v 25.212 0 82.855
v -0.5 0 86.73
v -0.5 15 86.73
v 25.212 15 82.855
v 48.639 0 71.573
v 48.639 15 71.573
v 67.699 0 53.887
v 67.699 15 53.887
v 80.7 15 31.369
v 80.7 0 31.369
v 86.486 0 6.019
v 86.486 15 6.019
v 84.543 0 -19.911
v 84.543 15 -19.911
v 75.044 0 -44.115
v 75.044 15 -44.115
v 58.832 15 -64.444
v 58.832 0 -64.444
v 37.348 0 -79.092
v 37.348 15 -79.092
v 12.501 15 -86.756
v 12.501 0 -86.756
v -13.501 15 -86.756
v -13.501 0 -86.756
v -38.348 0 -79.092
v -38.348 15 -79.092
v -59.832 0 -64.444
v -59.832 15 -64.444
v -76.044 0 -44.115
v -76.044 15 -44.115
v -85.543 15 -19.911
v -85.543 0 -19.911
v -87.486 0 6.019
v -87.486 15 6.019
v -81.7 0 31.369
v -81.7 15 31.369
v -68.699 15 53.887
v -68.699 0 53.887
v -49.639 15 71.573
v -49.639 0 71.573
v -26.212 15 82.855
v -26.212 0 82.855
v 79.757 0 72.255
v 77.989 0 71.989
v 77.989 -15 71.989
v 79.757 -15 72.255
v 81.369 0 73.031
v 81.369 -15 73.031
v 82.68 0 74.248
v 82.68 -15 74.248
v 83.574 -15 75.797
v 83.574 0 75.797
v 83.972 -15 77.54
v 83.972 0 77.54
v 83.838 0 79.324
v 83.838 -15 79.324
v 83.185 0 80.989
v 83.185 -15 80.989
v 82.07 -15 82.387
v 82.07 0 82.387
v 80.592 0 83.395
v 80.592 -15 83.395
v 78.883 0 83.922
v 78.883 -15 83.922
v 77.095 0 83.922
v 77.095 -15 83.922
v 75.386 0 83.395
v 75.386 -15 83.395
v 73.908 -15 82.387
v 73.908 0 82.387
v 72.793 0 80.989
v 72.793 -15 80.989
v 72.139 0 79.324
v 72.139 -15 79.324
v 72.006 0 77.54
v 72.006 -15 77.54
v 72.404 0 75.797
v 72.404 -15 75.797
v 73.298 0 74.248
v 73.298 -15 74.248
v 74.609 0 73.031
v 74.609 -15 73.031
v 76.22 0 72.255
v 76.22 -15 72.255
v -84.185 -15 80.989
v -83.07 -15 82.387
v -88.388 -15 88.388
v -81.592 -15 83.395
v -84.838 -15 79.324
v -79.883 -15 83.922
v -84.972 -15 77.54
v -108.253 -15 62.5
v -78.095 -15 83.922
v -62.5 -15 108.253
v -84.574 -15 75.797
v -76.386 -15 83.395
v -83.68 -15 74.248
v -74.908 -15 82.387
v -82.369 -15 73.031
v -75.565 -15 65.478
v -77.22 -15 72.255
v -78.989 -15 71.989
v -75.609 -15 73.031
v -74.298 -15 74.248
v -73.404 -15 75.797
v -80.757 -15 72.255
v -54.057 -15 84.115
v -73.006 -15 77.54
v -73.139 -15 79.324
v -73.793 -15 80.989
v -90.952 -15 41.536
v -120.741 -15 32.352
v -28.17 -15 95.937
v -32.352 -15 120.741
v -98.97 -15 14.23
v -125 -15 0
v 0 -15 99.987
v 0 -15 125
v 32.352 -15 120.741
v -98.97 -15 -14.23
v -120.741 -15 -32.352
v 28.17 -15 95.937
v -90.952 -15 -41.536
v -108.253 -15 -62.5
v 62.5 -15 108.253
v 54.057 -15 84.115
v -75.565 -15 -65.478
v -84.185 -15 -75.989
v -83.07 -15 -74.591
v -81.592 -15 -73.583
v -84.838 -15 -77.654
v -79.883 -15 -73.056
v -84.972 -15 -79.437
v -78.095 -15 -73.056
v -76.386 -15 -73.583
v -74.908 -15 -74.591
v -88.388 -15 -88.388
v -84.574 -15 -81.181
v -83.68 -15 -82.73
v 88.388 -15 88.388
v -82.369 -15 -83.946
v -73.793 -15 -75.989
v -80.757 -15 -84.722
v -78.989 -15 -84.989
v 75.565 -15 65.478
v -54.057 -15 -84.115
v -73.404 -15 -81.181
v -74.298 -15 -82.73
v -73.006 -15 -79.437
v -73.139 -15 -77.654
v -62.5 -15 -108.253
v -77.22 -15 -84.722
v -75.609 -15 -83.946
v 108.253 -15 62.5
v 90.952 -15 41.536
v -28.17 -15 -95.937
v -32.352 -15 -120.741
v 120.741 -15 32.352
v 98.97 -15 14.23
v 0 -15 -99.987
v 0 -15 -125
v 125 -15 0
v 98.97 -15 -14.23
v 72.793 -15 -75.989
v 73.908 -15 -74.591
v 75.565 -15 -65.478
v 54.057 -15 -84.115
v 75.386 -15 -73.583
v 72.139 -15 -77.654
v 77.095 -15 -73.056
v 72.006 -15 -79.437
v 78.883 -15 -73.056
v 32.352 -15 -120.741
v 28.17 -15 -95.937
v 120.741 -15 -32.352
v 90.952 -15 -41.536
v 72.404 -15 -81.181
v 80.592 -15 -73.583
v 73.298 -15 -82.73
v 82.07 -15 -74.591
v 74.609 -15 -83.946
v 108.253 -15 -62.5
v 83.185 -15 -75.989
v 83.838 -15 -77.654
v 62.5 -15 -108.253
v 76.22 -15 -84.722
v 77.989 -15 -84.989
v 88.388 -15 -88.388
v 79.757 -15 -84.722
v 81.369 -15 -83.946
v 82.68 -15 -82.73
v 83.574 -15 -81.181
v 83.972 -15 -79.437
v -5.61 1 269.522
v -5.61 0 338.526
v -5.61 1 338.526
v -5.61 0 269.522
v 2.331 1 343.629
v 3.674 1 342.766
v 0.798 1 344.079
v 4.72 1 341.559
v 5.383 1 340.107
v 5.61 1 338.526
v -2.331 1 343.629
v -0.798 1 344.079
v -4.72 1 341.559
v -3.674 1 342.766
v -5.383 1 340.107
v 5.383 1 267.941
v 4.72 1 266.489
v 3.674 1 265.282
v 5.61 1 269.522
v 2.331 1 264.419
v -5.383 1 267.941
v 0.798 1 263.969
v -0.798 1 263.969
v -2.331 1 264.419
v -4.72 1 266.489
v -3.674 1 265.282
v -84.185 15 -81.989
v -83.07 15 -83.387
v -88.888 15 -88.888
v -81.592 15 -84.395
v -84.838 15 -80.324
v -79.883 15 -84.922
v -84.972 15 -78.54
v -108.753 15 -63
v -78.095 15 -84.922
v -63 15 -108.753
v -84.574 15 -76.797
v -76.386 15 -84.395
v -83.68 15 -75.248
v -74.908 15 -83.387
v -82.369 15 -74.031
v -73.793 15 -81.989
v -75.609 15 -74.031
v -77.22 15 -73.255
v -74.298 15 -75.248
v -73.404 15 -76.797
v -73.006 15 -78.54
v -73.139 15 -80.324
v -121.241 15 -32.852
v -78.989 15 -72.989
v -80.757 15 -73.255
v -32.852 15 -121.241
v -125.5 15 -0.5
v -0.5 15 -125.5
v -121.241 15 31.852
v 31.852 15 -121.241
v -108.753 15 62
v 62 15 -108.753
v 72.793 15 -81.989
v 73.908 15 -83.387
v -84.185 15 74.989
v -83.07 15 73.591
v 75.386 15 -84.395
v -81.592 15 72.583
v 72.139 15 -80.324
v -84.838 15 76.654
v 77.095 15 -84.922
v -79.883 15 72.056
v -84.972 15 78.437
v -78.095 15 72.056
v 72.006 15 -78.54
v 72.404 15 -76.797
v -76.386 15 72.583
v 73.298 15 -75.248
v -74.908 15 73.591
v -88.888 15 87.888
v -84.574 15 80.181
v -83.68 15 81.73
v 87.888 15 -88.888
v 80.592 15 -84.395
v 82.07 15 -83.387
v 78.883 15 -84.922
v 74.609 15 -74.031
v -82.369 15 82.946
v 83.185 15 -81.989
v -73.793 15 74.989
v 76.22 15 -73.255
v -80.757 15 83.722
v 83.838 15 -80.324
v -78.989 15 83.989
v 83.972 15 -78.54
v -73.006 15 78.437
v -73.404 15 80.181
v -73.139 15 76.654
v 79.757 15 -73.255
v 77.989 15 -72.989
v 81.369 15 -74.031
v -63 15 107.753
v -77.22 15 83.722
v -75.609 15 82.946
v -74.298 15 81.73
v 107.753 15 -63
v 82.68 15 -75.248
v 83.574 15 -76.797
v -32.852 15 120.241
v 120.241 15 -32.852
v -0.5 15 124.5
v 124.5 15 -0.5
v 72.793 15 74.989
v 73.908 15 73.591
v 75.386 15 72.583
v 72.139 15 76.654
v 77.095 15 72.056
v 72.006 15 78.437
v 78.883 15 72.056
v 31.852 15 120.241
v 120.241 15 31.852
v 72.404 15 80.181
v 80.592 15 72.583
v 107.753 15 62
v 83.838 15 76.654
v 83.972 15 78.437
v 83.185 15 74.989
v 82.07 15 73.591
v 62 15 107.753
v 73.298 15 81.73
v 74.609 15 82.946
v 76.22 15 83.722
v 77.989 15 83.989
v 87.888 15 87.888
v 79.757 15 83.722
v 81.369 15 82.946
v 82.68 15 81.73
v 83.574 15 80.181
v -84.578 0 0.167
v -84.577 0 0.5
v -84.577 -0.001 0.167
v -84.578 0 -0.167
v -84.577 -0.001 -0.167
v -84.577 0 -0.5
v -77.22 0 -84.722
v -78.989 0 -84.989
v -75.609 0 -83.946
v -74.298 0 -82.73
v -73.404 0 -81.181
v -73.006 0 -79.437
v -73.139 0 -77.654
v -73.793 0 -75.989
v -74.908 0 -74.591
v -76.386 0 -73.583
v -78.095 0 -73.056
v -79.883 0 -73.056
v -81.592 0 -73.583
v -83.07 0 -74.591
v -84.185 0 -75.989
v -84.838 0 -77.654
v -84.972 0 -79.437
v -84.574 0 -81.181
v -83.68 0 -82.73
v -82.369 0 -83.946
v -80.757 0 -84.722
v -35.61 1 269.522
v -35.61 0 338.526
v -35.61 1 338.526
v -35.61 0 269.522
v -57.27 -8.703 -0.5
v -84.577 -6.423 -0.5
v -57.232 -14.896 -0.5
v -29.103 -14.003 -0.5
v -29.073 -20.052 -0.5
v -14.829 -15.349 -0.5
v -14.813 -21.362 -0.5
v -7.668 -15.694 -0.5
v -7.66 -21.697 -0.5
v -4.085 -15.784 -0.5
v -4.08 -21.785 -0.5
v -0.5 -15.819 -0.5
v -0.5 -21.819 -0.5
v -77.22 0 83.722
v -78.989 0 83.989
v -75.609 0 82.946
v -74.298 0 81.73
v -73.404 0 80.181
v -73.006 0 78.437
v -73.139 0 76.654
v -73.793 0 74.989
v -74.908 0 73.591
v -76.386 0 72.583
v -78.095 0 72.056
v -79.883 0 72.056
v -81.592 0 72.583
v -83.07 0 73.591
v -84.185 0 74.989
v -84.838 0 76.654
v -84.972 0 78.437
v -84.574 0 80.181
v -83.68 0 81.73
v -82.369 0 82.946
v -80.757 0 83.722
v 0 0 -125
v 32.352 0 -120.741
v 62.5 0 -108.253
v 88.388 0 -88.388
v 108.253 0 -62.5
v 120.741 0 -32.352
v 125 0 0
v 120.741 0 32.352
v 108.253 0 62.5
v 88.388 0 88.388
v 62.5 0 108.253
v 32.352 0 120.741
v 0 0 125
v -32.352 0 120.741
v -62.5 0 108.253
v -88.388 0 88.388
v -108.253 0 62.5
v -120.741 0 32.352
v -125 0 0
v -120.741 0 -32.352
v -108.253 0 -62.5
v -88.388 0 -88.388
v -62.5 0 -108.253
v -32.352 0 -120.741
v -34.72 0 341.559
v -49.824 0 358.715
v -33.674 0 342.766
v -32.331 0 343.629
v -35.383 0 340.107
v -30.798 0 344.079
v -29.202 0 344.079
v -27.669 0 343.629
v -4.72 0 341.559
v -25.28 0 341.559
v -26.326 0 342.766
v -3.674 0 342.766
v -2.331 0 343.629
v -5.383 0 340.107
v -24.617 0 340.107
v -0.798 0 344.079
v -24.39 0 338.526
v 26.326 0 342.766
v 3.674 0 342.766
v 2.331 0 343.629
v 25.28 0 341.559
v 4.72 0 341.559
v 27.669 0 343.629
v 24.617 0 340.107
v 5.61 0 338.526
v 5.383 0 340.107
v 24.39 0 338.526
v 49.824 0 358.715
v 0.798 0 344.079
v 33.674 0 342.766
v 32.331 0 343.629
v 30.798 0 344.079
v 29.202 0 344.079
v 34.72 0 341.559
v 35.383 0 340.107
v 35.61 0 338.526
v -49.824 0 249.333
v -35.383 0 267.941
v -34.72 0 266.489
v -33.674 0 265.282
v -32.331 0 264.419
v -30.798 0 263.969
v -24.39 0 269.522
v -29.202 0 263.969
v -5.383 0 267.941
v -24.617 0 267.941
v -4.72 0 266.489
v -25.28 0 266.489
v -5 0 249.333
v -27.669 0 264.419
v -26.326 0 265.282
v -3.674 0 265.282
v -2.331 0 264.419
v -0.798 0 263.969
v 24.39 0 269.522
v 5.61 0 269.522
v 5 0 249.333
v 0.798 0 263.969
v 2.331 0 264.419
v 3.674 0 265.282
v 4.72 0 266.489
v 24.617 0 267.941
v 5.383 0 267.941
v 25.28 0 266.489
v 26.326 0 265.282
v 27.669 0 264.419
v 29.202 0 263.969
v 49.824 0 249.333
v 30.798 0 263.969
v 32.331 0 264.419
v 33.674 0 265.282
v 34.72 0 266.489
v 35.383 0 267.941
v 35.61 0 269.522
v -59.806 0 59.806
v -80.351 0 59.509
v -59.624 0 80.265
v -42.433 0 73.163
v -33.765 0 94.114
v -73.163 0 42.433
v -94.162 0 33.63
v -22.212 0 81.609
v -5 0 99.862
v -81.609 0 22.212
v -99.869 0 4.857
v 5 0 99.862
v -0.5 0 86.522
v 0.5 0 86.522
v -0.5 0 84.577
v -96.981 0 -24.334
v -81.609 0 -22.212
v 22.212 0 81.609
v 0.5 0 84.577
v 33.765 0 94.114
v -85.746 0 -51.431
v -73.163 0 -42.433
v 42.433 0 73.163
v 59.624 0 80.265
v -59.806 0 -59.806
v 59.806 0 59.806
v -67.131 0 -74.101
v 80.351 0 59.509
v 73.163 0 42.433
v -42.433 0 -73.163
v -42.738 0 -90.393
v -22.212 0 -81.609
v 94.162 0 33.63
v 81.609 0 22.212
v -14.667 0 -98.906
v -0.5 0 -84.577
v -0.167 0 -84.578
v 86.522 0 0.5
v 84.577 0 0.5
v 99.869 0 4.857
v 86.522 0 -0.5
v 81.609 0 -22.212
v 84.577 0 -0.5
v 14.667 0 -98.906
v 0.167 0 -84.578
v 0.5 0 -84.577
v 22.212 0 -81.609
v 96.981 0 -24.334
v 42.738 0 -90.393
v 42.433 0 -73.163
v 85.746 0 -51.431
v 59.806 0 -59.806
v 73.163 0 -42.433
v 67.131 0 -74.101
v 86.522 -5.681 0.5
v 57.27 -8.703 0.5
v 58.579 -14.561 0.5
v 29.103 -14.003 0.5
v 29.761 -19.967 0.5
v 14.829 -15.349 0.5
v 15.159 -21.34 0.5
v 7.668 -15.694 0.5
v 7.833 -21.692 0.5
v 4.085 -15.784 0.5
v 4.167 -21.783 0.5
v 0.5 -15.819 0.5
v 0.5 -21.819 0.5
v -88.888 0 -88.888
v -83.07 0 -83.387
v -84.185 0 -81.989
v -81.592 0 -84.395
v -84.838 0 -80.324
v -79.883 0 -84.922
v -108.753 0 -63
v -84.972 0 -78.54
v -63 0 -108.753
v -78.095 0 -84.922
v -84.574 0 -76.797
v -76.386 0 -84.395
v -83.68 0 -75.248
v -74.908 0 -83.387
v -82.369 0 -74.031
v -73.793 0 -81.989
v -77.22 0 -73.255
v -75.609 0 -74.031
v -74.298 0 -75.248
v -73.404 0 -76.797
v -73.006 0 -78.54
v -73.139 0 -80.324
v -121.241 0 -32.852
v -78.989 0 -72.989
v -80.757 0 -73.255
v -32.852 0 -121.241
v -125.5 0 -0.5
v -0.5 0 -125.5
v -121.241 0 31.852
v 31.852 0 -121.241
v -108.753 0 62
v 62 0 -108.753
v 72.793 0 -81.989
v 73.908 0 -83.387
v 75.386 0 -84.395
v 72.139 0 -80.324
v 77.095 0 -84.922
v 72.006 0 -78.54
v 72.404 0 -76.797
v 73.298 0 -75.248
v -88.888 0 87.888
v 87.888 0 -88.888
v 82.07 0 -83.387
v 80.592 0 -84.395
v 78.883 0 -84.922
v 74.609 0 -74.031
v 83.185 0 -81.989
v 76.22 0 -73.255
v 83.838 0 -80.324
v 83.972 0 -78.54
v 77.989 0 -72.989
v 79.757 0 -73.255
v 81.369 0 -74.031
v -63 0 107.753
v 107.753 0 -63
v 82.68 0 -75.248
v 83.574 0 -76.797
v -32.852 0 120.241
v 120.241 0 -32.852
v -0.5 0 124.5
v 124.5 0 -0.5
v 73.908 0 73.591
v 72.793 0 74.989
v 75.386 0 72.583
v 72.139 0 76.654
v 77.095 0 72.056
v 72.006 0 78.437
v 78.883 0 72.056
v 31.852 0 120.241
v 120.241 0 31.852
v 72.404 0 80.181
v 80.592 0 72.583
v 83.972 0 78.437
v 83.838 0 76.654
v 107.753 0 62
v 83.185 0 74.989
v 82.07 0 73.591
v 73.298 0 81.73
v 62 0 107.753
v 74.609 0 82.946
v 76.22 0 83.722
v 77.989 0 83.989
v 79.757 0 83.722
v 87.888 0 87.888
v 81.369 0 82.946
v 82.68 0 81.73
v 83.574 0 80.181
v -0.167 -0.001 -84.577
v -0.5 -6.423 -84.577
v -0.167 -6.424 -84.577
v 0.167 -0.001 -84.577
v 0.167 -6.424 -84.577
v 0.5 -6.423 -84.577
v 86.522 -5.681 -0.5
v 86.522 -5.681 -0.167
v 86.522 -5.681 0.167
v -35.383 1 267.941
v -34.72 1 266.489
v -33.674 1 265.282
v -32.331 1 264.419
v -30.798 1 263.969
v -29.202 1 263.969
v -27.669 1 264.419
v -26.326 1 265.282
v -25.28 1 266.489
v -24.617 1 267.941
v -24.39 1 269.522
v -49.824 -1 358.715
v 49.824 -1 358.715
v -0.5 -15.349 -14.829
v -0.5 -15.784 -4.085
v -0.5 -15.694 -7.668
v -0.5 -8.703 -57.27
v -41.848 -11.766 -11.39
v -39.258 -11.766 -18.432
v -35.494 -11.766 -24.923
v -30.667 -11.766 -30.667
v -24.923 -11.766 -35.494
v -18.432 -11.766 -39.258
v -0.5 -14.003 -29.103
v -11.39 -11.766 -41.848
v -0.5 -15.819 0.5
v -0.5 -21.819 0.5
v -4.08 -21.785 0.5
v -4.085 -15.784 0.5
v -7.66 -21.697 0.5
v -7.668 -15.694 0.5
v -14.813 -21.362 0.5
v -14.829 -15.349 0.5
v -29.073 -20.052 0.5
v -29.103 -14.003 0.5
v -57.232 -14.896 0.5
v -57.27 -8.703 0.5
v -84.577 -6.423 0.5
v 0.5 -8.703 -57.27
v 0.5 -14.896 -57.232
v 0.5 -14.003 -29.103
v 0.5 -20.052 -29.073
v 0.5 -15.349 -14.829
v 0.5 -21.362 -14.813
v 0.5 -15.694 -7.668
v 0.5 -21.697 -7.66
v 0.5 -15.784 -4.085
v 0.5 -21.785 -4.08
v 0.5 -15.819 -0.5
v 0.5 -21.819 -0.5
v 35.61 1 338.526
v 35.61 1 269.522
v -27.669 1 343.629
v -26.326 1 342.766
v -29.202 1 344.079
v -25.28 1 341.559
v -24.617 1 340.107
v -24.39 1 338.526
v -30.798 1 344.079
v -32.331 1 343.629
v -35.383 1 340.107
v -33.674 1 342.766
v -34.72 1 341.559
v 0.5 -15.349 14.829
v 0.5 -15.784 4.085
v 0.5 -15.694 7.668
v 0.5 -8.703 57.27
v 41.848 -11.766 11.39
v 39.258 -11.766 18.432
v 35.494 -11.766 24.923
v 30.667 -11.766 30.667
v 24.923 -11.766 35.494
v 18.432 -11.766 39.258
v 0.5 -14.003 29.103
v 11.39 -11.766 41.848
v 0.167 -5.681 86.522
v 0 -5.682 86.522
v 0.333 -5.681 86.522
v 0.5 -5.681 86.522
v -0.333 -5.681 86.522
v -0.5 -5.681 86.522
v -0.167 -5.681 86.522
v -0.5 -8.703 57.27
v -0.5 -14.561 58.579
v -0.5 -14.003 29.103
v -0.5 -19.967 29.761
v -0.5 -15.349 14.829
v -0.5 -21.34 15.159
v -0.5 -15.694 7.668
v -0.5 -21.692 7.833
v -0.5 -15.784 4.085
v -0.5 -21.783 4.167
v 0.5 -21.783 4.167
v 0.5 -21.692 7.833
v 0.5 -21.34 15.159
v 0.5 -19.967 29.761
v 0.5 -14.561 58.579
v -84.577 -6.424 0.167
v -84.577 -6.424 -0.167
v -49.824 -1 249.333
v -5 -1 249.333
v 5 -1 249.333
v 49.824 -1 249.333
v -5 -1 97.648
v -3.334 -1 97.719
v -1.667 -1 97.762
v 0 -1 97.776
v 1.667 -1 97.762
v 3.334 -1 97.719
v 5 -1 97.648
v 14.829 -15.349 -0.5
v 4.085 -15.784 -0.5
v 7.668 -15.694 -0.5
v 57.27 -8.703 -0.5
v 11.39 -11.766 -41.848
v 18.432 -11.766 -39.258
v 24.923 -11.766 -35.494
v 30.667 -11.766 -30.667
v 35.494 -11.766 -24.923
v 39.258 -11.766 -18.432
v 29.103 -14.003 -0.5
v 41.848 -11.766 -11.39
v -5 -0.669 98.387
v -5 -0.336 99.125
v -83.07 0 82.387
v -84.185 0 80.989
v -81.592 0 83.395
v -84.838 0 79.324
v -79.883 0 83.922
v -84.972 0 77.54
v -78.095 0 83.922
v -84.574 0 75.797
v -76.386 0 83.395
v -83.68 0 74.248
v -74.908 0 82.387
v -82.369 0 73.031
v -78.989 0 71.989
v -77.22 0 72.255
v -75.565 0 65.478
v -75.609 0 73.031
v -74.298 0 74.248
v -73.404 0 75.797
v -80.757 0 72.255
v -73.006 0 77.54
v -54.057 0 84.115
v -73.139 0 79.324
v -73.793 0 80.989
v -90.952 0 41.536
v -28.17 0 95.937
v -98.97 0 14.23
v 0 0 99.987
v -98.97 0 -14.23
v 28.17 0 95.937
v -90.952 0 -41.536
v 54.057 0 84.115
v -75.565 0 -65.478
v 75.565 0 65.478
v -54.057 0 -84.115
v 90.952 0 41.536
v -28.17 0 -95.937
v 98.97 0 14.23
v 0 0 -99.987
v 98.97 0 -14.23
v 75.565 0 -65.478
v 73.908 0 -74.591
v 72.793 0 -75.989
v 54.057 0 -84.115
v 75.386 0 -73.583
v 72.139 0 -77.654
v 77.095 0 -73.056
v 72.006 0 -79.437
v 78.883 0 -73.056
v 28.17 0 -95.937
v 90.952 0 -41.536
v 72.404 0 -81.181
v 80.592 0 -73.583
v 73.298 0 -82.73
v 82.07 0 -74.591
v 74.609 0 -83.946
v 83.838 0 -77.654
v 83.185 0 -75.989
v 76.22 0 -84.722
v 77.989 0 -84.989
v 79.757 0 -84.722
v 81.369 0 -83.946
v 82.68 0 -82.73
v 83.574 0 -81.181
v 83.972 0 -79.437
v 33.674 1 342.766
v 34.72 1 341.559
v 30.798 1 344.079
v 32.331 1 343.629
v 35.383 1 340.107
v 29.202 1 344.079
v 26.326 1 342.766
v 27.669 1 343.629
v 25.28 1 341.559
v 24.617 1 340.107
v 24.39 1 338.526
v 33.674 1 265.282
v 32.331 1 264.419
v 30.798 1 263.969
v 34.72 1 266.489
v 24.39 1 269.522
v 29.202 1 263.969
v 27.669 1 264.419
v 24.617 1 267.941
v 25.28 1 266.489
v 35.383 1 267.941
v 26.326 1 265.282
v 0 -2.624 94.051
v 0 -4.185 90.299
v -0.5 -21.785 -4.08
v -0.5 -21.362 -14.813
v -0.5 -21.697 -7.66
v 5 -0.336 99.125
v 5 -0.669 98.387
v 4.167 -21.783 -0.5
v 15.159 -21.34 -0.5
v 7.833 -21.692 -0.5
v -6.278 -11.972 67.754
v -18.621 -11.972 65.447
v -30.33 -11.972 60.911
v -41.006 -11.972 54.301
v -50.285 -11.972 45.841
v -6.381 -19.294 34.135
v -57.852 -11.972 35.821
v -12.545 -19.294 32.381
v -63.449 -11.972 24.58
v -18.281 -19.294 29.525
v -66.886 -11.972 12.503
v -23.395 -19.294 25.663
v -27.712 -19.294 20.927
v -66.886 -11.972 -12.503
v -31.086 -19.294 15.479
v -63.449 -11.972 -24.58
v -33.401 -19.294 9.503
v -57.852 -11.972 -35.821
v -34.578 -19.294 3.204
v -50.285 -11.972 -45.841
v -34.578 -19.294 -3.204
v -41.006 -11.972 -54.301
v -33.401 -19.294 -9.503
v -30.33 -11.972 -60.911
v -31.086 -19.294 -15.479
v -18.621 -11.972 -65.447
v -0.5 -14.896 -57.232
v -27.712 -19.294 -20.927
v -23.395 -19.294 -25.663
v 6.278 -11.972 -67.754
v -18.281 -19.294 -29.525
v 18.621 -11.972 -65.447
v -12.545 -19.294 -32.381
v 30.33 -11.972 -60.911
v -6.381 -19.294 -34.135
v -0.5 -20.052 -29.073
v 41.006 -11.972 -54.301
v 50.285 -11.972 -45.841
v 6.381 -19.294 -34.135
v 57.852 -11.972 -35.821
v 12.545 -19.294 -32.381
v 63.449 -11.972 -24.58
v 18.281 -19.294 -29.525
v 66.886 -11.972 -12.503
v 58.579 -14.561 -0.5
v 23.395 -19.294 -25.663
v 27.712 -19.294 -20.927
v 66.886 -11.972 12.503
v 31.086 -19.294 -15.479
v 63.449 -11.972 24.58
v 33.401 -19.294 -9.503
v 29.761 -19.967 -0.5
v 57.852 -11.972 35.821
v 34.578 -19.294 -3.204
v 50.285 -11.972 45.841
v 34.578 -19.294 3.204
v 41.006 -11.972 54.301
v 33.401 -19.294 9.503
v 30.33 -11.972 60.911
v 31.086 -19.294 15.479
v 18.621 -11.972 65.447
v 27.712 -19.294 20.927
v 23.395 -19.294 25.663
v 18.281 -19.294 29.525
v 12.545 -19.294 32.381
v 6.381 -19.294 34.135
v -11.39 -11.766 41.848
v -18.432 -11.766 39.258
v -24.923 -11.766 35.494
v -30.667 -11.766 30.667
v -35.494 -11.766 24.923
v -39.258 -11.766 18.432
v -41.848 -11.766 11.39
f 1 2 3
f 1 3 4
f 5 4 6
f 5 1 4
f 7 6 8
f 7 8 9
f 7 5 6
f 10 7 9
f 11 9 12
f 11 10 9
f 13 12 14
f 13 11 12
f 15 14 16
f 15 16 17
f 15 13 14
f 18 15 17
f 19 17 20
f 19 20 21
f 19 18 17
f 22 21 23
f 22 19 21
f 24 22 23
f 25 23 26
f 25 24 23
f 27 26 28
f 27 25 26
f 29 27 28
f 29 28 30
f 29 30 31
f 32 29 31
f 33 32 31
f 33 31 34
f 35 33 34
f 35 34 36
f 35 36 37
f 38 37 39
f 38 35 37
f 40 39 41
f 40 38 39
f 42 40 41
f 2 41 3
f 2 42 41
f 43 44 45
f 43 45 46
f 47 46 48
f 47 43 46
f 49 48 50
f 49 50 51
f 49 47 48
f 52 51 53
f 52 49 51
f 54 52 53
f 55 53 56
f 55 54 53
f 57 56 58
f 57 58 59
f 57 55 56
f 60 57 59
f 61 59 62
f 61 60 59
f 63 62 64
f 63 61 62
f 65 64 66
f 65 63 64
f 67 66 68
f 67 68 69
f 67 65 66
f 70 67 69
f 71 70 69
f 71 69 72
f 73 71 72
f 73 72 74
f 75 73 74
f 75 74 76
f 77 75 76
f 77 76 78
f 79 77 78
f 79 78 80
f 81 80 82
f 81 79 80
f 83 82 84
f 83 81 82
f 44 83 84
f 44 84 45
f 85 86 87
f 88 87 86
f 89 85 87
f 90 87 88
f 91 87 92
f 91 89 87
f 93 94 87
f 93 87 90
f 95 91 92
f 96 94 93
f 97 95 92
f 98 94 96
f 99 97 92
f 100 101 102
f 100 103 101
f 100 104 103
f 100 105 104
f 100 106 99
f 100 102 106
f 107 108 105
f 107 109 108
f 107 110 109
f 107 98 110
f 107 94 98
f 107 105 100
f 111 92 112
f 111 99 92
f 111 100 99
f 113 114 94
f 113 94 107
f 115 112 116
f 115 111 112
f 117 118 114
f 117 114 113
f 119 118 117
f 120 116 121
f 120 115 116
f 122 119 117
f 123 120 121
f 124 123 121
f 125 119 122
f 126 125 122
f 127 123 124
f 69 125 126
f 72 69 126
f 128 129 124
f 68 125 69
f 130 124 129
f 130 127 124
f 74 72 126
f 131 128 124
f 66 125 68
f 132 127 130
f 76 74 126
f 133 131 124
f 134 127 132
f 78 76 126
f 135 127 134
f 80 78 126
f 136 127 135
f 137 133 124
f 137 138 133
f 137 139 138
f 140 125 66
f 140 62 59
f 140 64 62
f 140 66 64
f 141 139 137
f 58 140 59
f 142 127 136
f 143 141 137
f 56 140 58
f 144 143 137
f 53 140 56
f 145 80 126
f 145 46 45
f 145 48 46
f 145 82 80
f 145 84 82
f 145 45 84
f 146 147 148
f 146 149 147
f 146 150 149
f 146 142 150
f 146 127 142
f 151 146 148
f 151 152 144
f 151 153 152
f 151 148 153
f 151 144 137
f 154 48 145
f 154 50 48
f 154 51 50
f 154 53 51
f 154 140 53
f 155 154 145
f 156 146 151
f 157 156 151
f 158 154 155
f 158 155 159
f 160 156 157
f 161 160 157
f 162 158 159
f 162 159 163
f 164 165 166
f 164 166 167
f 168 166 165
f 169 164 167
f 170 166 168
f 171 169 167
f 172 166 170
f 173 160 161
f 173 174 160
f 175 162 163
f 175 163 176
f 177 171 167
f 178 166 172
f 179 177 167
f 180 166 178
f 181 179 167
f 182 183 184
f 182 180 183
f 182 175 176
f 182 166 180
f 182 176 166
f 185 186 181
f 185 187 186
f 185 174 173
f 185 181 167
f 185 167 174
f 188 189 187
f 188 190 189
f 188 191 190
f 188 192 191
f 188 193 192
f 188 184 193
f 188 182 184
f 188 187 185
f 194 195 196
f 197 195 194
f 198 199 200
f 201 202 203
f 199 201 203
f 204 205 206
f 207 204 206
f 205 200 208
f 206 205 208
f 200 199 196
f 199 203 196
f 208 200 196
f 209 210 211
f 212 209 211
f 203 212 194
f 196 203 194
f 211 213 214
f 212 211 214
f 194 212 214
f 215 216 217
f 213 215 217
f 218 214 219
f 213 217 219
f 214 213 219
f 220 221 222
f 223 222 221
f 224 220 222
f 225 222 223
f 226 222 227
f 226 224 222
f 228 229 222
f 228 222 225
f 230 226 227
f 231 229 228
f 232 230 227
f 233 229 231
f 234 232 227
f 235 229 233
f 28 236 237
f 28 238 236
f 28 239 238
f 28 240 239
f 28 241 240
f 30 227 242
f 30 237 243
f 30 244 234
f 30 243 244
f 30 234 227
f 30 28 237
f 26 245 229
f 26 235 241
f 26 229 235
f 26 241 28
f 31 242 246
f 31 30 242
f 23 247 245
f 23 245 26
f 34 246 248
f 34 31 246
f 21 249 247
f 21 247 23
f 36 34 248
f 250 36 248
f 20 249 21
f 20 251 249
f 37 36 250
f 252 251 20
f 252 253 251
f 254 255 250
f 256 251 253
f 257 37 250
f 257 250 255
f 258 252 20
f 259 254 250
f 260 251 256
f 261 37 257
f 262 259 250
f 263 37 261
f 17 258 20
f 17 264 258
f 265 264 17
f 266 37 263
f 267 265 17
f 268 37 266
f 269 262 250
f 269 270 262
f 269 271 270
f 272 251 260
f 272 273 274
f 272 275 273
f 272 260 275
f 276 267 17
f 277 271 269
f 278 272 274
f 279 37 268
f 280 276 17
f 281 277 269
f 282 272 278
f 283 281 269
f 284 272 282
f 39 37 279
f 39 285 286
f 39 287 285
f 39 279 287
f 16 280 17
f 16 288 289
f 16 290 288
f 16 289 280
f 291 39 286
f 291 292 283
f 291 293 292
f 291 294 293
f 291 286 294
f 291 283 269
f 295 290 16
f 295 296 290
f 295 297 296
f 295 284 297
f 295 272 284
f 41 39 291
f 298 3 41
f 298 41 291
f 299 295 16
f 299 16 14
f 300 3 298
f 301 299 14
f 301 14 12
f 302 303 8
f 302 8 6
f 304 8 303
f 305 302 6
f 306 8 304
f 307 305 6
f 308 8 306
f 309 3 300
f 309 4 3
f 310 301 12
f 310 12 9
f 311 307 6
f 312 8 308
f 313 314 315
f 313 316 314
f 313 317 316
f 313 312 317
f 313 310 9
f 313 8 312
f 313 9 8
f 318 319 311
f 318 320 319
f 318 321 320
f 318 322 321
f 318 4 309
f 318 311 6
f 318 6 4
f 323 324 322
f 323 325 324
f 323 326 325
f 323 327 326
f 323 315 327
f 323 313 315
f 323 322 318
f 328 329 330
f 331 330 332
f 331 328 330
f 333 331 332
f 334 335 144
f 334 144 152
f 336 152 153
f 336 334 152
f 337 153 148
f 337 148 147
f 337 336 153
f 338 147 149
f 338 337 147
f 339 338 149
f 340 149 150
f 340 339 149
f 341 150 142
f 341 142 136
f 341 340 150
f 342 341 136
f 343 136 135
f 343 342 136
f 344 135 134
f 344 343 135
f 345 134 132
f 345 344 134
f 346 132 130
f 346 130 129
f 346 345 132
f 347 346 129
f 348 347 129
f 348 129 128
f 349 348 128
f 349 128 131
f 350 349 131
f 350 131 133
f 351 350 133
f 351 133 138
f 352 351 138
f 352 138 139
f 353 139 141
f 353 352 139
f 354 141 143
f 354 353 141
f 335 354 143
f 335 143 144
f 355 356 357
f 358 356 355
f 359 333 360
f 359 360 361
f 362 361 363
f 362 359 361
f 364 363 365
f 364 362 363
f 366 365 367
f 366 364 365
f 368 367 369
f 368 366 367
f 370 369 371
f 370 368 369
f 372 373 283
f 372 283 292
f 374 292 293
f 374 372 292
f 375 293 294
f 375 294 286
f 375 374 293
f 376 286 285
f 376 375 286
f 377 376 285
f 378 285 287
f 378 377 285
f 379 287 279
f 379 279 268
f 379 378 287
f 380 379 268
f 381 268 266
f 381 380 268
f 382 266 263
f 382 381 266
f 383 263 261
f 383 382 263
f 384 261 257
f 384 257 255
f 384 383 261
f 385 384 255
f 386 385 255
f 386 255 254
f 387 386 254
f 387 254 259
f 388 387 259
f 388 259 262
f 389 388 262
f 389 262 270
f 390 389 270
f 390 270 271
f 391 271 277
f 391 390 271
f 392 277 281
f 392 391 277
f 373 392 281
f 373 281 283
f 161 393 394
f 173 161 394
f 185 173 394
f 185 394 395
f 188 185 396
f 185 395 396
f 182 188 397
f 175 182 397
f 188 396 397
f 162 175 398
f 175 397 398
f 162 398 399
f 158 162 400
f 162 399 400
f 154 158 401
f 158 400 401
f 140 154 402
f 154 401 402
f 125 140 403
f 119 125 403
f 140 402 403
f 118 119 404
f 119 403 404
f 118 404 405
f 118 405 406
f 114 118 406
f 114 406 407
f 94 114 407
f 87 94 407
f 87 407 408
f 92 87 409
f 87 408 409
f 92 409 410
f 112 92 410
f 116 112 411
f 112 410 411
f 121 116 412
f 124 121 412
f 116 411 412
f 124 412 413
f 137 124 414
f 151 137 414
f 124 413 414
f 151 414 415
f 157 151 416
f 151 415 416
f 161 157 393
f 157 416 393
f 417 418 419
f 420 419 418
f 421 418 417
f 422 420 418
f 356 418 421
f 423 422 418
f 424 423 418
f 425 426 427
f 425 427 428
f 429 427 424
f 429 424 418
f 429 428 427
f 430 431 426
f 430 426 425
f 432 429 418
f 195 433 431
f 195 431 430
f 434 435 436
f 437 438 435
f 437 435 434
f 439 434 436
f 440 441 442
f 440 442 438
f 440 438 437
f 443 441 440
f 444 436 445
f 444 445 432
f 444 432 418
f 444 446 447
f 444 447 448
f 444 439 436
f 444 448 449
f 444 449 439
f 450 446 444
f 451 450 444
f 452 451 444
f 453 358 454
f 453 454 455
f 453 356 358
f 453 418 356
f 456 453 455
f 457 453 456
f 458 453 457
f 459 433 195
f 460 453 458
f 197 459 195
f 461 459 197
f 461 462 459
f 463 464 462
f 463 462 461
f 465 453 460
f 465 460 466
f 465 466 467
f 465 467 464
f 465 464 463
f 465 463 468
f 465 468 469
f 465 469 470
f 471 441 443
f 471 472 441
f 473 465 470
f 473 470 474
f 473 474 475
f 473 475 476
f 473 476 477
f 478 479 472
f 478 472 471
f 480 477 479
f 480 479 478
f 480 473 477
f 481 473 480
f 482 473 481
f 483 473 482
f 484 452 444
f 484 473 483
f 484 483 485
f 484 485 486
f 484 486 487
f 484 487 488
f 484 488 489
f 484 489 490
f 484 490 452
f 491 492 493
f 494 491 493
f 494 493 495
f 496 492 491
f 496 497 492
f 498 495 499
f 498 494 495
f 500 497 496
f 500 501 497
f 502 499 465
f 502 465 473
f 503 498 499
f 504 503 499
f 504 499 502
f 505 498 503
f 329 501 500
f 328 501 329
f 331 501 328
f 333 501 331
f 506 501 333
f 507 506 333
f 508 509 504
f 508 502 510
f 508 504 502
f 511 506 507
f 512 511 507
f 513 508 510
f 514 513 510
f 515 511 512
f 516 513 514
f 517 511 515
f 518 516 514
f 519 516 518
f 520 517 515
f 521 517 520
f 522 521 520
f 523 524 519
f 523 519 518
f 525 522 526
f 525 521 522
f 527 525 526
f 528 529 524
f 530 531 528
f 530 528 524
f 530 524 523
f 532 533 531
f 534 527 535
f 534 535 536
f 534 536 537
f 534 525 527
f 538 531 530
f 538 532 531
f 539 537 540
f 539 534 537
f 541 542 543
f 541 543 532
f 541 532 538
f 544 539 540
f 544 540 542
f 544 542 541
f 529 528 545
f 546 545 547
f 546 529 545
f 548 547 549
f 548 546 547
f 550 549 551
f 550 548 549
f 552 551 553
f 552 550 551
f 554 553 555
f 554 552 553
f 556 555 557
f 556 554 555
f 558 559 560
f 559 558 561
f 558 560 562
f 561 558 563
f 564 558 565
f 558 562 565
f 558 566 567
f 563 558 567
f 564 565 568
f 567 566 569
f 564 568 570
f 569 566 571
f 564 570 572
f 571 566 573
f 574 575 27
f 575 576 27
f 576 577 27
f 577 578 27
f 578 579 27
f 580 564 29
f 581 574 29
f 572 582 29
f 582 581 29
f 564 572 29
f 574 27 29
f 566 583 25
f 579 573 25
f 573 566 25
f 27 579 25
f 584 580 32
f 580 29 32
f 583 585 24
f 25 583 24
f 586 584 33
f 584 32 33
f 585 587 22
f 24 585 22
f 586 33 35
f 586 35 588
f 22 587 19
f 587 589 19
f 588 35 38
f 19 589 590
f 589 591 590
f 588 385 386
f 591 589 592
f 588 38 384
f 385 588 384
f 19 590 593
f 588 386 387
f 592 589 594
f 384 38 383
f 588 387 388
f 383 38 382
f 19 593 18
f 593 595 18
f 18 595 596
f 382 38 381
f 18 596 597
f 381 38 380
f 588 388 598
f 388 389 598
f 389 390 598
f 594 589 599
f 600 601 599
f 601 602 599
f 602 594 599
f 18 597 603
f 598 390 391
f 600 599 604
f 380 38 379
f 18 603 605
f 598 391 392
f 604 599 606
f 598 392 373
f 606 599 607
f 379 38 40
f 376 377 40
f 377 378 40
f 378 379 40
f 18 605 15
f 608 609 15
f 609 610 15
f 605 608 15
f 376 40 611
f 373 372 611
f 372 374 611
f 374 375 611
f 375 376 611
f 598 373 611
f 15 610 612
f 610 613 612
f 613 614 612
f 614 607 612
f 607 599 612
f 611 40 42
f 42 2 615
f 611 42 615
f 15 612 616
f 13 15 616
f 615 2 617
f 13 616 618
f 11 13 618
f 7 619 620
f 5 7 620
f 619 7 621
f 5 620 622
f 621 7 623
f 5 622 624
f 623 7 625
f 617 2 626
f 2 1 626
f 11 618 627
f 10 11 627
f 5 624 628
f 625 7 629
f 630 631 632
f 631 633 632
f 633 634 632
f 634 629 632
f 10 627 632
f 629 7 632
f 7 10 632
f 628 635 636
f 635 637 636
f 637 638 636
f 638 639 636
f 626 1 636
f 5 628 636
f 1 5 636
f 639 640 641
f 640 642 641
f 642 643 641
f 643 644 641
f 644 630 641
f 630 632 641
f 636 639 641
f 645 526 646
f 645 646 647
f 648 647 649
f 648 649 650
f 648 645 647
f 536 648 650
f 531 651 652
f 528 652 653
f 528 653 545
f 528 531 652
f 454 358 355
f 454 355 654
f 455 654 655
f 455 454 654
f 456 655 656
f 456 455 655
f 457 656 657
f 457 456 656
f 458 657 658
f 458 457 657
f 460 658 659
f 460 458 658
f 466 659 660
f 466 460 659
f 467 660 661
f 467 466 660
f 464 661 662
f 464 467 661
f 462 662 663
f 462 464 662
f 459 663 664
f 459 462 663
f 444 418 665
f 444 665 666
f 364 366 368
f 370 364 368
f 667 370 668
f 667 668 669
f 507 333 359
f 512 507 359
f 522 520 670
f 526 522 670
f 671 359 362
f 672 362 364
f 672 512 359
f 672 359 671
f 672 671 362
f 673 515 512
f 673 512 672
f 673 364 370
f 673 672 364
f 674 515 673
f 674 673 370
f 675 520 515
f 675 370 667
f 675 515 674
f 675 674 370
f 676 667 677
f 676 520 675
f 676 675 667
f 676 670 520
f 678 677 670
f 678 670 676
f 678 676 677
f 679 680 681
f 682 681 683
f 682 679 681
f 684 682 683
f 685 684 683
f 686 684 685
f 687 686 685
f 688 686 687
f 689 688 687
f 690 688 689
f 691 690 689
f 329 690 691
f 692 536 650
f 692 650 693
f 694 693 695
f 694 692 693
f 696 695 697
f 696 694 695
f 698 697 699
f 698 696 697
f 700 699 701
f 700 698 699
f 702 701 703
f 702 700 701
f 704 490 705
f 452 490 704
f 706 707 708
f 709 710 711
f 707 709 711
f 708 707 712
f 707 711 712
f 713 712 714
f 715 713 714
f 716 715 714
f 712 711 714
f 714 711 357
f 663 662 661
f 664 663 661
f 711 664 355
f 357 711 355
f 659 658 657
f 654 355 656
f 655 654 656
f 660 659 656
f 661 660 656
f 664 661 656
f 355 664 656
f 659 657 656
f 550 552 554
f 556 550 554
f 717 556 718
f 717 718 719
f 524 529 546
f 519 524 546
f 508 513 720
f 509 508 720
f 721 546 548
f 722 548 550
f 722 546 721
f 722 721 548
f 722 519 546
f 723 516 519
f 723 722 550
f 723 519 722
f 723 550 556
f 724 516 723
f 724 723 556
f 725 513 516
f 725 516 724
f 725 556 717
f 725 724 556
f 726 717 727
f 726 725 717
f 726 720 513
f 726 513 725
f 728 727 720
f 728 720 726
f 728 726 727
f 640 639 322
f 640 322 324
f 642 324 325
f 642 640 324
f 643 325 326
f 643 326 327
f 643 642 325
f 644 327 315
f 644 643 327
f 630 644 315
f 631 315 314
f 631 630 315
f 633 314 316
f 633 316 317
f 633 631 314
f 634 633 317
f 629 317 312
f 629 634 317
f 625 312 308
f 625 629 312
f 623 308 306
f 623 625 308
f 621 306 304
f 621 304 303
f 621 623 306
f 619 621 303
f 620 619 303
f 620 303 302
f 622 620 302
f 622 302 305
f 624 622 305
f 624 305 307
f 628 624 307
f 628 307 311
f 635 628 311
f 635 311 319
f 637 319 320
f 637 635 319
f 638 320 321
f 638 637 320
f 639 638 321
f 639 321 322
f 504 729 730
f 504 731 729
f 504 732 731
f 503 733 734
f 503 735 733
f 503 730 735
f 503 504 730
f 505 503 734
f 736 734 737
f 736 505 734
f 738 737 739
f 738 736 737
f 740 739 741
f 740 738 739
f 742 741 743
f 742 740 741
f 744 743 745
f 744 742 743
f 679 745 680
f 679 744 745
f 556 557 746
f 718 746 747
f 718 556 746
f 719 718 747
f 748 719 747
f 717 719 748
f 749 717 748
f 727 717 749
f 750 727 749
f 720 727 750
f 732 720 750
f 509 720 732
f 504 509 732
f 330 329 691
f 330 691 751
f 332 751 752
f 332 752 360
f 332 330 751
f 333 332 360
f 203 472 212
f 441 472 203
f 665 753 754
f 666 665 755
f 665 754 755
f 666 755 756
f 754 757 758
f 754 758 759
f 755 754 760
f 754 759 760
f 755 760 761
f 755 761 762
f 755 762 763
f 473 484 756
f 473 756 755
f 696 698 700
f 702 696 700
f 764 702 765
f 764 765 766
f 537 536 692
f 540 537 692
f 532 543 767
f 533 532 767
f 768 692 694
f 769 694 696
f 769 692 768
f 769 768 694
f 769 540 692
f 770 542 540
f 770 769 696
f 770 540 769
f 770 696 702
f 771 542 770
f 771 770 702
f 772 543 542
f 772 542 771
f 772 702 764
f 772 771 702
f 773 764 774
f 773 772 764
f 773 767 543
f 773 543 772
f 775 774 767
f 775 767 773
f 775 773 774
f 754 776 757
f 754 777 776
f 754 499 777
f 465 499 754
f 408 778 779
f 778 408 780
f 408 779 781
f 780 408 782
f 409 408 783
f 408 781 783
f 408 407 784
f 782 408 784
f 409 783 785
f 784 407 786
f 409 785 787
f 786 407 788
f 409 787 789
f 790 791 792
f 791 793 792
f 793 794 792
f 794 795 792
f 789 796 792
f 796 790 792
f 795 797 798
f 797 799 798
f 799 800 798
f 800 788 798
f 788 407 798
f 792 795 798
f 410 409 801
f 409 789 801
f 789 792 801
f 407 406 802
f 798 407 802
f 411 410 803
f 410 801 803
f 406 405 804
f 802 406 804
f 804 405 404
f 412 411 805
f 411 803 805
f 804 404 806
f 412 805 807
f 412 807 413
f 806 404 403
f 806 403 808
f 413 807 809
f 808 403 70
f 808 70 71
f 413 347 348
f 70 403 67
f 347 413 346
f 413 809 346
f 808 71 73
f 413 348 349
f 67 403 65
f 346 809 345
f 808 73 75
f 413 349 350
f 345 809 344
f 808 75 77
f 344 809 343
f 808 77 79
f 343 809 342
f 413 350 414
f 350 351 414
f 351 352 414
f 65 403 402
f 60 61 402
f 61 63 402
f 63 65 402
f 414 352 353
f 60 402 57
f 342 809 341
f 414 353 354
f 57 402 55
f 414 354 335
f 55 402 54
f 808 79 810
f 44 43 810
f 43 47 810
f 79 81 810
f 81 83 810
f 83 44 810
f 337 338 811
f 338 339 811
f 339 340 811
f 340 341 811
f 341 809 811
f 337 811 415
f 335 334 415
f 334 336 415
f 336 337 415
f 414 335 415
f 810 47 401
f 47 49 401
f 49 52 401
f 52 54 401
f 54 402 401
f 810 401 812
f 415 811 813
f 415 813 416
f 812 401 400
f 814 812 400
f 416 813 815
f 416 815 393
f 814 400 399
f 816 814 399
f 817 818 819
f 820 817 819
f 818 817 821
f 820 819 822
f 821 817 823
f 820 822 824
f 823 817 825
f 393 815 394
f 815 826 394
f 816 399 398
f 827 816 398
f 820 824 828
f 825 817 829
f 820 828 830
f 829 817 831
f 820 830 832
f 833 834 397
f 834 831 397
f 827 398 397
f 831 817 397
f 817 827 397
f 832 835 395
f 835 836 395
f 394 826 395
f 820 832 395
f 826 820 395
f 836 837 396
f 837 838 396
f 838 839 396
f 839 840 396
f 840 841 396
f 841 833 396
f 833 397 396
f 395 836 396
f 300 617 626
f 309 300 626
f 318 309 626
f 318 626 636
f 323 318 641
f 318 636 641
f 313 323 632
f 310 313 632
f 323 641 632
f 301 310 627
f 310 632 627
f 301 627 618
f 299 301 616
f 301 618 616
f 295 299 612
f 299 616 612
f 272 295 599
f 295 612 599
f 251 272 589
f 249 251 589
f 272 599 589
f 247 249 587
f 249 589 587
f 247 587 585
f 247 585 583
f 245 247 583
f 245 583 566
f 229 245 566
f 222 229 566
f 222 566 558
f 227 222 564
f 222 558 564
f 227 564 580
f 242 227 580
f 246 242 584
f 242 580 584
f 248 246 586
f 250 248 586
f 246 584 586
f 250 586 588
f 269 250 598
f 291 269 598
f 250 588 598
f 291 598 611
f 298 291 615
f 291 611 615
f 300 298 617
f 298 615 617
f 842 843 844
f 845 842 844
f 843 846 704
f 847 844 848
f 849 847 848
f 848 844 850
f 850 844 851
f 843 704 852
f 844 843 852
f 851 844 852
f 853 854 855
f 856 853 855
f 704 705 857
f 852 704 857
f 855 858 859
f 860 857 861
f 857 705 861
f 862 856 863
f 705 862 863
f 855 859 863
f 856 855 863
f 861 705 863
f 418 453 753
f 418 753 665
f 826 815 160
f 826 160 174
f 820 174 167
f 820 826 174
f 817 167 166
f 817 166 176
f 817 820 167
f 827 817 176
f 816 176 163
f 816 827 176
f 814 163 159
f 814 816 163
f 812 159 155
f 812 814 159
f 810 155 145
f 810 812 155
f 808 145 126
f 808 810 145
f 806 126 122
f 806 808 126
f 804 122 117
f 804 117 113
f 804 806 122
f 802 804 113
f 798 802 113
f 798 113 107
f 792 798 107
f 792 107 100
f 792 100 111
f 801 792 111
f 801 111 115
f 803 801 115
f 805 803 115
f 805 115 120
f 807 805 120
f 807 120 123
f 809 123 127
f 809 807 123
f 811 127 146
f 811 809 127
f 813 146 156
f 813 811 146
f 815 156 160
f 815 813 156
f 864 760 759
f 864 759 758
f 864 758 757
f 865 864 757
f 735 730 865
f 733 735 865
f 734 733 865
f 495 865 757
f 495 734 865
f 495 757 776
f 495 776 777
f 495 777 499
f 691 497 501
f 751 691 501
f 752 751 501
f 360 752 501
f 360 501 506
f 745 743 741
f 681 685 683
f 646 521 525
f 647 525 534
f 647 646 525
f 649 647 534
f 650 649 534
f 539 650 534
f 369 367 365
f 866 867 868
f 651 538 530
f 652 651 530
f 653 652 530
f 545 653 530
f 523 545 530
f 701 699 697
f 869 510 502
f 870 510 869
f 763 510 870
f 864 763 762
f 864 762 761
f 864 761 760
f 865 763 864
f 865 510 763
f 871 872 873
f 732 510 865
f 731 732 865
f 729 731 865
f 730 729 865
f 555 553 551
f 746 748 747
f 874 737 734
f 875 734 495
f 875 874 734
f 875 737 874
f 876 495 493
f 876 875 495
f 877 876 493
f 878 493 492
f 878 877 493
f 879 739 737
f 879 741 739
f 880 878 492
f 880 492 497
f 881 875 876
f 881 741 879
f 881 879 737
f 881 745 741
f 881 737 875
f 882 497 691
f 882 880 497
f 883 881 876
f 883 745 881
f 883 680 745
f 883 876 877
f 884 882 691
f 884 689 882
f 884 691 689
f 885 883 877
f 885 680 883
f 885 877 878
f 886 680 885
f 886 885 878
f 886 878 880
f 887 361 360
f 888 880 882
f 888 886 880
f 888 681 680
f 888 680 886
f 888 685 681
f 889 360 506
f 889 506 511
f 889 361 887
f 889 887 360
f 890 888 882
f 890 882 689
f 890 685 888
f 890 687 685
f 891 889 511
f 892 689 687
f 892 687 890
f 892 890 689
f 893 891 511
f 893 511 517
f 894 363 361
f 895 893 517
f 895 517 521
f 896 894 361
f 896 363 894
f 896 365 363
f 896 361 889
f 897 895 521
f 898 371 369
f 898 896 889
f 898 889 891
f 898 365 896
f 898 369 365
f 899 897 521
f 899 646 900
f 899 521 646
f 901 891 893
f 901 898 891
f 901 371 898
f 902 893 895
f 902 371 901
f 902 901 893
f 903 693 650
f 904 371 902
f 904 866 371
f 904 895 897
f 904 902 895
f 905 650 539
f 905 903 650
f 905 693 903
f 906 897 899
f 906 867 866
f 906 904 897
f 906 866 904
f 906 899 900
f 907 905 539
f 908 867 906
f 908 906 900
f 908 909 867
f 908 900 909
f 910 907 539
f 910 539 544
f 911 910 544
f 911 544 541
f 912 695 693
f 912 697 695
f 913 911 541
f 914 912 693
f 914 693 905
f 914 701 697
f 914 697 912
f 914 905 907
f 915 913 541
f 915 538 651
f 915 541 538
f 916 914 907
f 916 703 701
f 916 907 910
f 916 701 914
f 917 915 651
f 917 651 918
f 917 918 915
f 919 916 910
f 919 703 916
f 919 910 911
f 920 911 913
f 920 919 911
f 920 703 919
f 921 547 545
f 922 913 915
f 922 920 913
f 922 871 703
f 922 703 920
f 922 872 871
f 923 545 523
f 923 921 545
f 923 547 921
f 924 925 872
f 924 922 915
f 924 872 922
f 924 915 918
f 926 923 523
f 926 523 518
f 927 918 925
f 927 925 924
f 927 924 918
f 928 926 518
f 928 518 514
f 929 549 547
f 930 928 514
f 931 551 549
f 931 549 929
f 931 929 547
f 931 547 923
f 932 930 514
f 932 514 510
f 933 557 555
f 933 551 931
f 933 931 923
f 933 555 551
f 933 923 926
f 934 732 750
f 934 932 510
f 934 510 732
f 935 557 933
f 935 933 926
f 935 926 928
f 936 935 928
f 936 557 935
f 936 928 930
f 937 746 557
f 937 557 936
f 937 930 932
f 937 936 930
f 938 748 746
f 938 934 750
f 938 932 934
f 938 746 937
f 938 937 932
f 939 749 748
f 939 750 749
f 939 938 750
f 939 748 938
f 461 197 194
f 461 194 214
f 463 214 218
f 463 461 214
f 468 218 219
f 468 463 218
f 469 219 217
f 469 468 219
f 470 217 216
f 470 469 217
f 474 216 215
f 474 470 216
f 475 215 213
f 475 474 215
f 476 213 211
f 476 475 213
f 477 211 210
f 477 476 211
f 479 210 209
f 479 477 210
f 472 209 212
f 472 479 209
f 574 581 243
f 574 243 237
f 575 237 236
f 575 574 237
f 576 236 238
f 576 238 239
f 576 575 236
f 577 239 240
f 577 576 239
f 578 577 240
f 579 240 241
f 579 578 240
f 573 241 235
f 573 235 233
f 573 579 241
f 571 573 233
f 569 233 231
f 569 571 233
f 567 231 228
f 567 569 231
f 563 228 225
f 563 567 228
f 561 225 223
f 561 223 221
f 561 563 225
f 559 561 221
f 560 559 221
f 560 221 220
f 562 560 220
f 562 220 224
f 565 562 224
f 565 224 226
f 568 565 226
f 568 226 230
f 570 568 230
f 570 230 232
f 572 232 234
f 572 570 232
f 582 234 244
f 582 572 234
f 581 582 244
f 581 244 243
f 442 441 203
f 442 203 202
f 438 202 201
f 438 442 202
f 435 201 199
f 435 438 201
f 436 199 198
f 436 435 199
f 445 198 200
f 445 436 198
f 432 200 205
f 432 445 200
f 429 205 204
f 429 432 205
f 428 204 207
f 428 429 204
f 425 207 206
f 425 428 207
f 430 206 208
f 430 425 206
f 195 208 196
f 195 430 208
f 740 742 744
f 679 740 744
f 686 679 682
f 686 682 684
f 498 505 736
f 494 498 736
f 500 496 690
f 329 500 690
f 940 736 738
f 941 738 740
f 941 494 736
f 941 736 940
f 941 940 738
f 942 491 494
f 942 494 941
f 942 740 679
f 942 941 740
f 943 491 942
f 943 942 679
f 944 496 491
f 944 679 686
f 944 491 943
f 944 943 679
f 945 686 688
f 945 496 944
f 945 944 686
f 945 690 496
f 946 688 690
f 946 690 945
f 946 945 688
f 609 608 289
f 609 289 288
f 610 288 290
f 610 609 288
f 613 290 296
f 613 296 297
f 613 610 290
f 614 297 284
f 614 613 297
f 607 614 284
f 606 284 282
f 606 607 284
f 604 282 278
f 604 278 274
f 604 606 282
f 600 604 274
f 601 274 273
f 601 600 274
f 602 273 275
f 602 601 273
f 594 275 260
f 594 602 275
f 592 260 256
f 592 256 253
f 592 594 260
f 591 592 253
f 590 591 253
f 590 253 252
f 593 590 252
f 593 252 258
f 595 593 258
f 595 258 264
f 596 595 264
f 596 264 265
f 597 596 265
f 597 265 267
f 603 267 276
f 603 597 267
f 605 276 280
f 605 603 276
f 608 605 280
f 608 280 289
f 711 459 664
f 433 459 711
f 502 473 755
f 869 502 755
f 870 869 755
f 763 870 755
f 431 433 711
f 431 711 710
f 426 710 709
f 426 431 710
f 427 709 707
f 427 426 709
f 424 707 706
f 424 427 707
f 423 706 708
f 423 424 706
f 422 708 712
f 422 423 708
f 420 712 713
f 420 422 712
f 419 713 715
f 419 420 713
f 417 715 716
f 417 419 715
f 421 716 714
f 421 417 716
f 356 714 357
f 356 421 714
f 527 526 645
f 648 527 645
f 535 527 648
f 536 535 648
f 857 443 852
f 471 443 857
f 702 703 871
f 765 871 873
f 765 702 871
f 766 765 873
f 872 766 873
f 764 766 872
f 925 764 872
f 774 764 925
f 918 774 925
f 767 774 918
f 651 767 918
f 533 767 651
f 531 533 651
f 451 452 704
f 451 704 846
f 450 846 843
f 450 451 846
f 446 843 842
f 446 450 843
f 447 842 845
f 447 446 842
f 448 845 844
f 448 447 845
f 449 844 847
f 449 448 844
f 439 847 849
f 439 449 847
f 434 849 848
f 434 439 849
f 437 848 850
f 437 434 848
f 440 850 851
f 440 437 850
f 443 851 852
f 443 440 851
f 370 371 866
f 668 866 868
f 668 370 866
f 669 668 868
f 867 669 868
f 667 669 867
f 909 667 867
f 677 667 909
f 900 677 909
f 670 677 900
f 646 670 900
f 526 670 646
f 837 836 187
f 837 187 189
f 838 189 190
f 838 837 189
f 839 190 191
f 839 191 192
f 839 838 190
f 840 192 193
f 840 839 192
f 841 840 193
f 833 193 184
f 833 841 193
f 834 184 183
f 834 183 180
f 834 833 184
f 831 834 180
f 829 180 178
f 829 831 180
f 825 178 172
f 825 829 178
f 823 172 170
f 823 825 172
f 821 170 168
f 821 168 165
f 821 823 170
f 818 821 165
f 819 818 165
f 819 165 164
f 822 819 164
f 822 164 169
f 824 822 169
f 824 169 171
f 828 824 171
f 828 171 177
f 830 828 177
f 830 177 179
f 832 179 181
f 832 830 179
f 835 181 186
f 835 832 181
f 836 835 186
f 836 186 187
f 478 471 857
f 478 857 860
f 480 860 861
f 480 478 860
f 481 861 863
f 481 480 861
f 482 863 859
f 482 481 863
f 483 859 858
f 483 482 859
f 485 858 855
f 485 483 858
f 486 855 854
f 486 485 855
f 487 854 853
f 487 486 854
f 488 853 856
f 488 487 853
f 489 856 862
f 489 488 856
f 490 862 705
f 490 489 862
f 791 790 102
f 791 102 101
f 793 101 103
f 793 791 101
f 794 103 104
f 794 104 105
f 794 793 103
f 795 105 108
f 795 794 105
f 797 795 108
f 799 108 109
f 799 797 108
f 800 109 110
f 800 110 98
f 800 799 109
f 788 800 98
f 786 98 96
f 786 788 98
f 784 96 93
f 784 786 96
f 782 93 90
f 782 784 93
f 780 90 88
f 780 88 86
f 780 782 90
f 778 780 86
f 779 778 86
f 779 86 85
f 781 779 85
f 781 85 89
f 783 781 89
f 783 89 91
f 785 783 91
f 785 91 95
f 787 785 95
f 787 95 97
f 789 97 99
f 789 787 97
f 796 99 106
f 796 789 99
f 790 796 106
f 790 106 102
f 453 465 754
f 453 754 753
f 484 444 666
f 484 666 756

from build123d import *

# Parameters (mm, degrees)
KES_EKSTR_ZYON1_REACH       = 145.077
KES_EKSTR_ZYON1_END_RADIUS  = 240
Y_KSEKLIK_EKSTR_ZYON1_DEPTH = 1
Y_KSEKLIK_EKSTR_ZYON2_DEPTH = 1
IZIM5_R                     = 125
IZIM5_R_2                   = 87.230350479
IZIM5_R_3                   = 6
Y_KSEKLIK_EKSTR_ZYON4_DEPTH = 15
IZIM6_R                     = 125
IZIM6_R_2                   = 99.987437211
IZIM6_R_3                   = 6
Y_KSEKLIK_EKSTR_ZYON6_DEPTH = 15


with BuildPart() as part:
    # Çizim1 → Döndür1 (revolve)
    with BuildSketch(Plane(origin=(0, 0, 0), x_dir=(0, 0, -1), z_dir=(1, 0, 0))):
        with BuildLine():
            Line((-84.578292723, 0), (-99.987437211, 0))
            ThreePointArc((-99.987437211, 0), (-51.170303888, -16.301555778), (0, -21.82))
            Line((0, -21.82), (0, -15.82))
            ThreePointArc((0, -15.82), (-43.022552226, -11.830999737), (-84.578292723, 0))
        make_face()
    revolve(axis=Axis((0, 0, 0), (0, -1, 0)))

    # Kes-Ekstrüzyon1: up to this sphere (the profile starts inside it)
    kes_ekstr_zyon1_end = Location((0, 218.18, 0)) * Sphere(KES_EKSTR_ZYON1_END_RADIUS, mode=Mode.PRIVATE)
    # Çizim2 → Kes-Ekstrüzyon1 (cut, up to the surface)
    with BuildSketch(Plane(origin=(0, 0, 0), x_dir=(1, 0, 0), z_dir=(0, 1, 0)), mode=Mode.PRIVATE) as kes_ekstr_zyon1_sk1:
        Polygon((-0.5, -0.5), (-84.57681479, -0.5), (-84.57681479, 0.5), (-0.5, 0.5), (-0.5, 84.57681479), (0.5, 84.57681479), (0.5, 0.5), (86.521798987, 0.5), (86.521798987, -0.5), (0.5, -0.5), (0.5, -86.521798987), (-0.5, -86.521798987), align=None)
    kes_ekstr_zyon1_tool1 = extrude(kes_ekstr_zyon1_sk1.sketch, amount=-KES_EKSTR_ZYON1_REACH, mode=Mode.PRIVATE) & kes_ekstr_zyon1_end
    add(kes_ekstr_zyon1_tool1.solids().sort_by_distance((0.487671, 0, 0.487671))[0], mode=Mode.SUBTRACT)

    # Çizim3 → Yükseklik-Ekstrüzyon1 (add)
    with BuildSketch(Plane(origin=(0, 0, 0), x_dir=(1, 0, 0), z_dir=(0, 1, 0))):
        Polygon((-5, -249.333468386), (-49.82370334, -249.333468386), (-49.82370334, -358.714534318), (49.82370334, -358.714534318), (49.82370334, -249.333468386), (5, -249.333468386), (5, -95.85370377), (-5, -95.85370377), align=None)
    extrude(amount=-Y_KSEKLIK_EKSTR_ZYON1_DEPTH)

    # Çizim4 → Yükseklik-Ekstrüzyon2 (add)
    with BuildSketch(Plane(origin=(0, 0, 0), x_dir=(1, 0, 0), z_dir=(0, 1, 0))):
        with BuildLine():
            Line((35.61012652, -269.521723251), (35.61012652, -338.526279453))
            ThreePointArc((35.61012652, -338.526279453), (30, -344.136405973), (24.38987348, -338.526279453))
            Line((24.38987348, -338.526279453), (24.38987348, -269.521723251))
            ThreePointArc((24.38987348, -269.521723251), (30, -263.911596731), (35.61012652, -269.521723251))
        make_face()
        with BuildLine():
            Line((5.61012652, -269.521723251), (5.61012652, -338.526279453))
            ThreePointArc((5.61012652, -338.526279453), (0, -344.136405973), (-5.61012652, -338.526279453))
            Line((-5.61012652, -338.526279453), (-5.61012652, -269.521723251))
            ThreePointArc((-5.61012652, -269.521723251), (0, -263.911596731), (5.61012652, -269.521723251))
        make_face()
        with BuildLine():
            Line((-24.38987348, -269.521723251), (-24.38987348, -338.526279453))
            ThreePointArc((-24.38987348, -338.526279453), (-30, -344.136405973), (-35.61012652, -338.526279453))
            Line((-35.61012652, -338.526279453), (-35.61012652, -269.521723251))
            ThreePointArc((-35.61012652, -269.521723251), (-30, -263.911596731), (-24.38987348, -269.521723251))
        make_face()
    extrude(amount=Y_KSEKLIK_EKSTR_ZYON2_DEPTH)


with BuildPart() as body_2:
    # Çizim5 → Yükseklik-Ekstrüzyon4 (new body)
    with BuildSketch(Plane(origin=(0, 0, 0), x_dir=(1, 0, 0), z_dir=(0, 1, 0))):
        with Locations(Location((-0.5, 0.5, 0), (0, 0, 270))):
            Circle(IZIM5_R)
        with Locations(Location((-0.5, 0.5, 0), (0, 0, 270))):
            Circle(IZIM5_R_2, mode=Mode.SUBTRACT)
        with Locations(Location((-78.988852712, 78.988852712, 0), (0, 0, 270))):
            Circle(IZIM5_R_3, mode=Mode.SUBTRACT)
        with Locations(Location((77.988852712, 78.988852712, 0), (0, 0, 270))):
            Circle(IZIM5_R_3, mode=Mode.SUBTRACT)
        with Locations(Location((77.988852712, -77.988852712, 0), (0, 0, 270))):
            Circle(IZIM5_R_3, mode=Mode.SUBTRACT)
        with Locations(Location((-78.988852712, -77.988852712, 0), (0, 0, 270))):
            Circle(IZIM5_R_3, mode=Mode.SUBTRACT)
    extrude(amount=Y_KSEKLIK_EKSTR_ZYON4_DEPTH)


with BuildPart() as body_3:
    # Çizim6 → Yükseklik-Ekstrüzyon6 (new body)
    with BuildSketch(Plane.XZ):
        with Locations(Location((0, 0, 0), (0, 0, 270))):
            Circle(IZIM6_R)
        with Locations(Location((0, 0, 0), (0, 0, 270))):
            Circle(IZIM6_R_2, mode=Mode.SUBTRACT)
        with Locations(Location((77.988852712, -78.988852712, 0), (0, 0, 270))):
            Circle(IZIM6_R_3, mode=Mode.SUBTRACT)
        with Locations(Location((-78.988852712, -78.988852712, 0), (0, 0, 270))):
            Circle(IZIM6_R_3, mode=Mode.SUBTRACT)
        with Locations(Location((-78.988852712, 77.988852712, 0), (0, 0, 270))):
            Circle(IZIM6_R_3, mode=Mode.SUBTRACT)
        with Locations(Location((77.988852712, 77.988852712, 0), (0, 0, 270))):
            Circle(IZIM6_R_3, mode=Mode.SUBTRACT)
    extrude(amount=Y_KSEKLIK_EKSTR_ZYON6_DEPTH)


solid = Compound([part.part, body_2.part, body_3.part])
